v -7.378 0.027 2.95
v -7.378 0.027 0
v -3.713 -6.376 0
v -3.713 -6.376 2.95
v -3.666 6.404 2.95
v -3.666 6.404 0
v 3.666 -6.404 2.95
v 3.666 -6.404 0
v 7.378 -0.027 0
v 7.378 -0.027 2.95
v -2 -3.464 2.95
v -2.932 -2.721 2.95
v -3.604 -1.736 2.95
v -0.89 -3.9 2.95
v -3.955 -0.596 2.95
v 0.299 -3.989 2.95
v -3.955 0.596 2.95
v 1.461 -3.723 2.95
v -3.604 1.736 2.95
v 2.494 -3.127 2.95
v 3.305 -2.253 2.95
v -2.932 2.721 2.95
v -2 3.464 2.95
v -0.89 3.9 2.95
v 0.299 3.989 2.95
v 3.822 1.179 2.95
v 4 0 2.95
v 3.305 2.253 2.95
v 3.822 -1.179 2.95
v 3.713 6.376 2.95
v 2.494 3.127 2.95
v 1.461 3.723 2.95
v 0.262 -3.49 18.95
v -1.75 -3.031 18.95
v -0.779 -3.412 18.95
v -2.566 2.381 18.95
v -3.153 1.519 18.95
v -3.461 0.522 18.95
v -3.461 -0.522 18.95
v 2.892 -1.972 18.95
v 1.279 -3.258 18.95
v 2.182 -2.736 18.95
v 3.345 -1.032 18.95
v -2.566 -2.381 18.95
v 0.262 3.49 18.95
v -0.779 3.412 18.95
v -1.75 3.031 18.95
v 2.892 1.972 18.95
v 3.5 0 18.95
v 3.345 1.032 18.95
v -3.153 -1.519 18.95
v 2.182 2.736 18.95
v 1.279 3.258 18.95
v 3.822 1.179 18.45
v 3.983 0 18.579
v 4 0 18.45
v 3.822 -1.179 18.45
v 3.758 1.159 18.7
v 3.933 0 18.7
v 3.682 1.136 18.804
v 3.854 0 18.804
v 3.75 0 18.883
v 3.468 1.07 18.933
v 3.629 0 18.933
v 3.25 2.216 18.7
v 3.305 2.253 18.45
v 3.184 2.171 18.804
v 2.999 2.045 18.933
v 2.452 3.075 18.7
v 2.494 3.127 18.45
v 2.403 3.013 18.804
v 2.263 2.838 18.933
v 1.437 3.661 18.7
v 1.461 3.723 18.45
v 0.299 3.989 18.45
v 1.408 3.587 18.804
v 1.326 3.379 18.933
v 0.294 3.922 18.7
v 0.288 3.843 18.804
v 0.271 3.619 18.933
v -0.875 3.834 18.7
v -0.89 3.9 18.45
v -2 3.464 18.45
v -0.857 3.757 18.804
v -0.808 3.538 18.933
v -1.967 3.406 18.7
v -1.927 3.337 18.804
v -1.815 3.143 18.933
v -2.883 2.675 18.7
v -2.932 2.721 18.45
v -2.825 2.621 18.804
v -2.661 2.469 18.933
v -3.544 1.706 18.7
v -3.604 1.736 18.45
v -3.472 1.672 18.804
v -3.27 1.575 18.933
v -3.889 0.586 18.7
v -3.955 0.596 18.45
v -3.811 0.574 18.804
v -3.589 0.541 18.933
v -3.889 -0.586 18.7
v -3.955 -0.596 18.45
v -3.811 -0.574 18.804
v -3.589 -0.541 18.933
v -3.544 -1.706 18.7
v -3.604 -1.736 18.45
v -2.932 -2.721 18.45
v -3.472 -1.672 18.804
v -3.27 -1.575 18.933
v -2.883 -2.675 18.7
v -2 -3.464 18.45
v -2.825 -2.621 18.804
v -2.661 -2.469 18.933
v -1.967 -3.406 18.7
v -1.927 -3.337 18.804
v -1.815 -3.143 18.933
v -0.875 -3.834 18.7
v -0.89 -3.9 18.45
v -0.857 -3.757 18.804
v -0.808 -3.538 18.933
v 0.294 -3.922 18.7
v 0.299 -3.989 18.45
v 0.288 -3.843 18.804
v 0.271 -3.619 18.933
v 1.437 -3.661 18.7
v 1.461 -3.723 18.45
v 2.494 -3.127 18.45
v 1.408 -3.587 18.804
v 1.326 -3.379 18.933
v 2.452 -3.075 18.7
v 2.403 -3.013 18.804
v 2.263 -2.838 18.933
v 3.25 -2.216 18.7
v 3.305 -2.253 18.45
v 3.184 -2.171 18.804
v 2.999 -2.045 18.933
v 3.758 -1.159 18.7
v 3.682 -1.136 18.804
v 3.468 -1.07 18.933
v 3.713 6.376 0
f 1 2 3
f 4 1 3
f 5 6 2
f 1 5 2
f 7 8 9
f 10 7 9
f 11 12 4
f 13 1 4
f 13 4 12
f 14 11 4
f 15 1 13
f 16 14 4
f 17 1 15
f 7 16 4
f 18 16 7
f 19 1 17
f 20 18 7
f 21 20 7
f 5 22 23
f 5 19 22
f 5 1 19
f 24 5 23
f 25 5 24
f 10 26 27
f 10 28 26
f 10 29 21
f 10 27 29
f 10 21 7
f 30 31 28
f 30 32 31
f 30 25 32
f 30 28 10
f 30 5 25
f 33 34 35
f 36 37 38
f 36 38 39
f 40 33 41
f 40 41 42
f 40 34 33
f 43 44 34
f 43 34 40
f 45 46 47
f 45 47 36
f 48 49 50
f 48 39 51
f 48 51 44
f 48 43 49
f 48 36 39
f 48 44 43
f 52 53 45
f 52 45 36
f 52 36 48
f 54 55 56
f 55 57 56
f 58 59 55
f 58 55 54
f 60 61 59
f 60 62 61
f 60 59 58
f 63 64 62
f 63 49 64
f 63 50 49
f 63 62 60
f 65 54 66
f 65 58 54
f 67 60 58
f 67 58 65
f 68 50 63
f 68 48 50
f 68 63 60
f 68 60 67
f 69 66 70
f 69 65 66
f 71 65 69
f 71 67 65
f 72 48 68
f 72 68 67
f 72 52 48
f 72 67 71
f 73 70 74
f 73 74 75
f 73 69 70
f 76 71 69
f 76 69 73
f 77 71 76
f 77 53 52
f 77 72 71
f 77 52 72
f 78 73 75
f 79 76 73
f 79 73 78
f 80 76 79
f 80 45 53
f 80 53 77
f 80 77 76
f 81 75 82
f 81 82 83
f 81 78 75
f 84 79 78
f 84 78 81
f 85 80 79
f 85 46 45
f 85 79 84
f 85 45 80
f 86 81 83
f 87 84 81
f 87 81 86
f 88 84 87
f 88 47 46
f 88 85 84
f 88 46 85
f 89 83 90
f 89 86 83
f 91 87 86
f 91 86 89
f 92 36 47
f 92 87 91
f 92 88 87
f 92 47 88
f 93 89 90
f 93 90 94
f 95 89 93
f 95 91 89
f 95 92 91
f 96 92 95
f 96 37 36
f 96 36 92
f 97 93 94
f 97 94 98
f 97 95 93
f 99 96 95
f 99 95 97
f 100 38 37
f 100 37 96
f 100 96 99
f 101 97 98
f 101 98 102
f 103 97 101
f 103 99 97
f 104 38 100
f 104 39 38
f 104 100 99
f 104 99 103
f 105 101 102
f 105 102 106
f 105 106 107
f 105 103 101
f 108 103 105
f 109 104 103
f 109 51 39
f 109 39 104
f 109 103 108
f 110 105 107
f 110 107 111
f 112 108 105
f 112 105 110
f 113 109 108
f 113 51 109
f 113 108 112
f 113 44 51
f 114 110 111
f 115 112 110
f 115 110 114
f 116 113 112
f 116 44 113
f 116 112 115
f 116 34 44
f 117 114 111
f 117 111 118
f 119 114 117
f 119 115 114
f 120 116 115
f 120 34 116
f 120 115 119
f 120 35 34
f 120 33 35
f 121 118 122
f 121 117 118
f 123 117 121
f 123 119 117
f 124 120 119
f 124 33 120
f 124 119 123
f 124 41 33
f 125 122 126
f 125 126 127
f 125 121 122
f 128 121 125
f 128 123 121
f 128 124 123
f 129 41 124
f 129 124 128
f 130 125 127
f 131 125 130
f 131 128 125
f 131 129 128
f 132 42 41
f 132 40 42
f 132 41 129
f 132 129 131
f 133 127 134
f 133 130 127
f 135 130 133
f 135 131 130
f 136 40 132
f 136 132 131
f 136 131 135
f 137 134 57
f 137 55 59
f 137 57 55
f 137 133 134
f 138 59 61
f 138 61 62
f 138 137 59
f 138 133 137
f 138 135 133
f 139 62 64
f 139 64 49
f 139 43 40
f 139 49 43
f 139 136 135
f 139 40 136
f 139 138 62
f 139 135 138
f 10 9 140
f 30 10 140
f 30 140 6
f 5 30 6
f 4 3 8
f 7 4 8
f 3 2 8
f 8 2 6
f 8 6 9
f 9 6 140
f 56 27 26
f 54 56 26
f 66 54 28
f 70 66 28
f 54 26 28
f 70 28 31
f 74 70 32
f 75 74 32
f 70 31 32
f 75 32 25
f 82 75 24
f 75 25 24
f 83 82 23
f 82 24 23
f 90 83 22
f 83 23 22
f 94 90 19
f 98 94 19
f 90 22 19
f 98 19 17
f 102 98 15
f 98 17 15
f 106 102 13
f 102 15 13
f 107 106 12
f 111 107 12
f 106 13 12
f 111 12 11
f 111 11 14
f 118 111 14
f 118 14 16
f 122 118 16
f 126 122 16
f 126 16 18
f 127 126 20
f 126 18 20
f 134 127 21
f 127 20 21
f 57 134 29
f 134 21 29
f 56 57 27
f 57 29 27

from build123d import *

# Parameters (mm, degrees)
Y_KSEKLIK_EKSTR_ZYON1_DEPTH = 2.95
IZIM3_R                     = 4
Y_KSEKLIK_EKSTR_ZYON2_DEPTH = 16
RADYUS3_R                   = 0.5


with BuildPart() as part:
    # Çizim2 → Yükseklik-Ekstrüzyon1 (new body)
    with BuildSketch(Plane.XY):
        Polygon((3.712848138, 6.376327996), (-3.665637958, 6.403584805), (-7.378486096, 0.02725681), (-3.712848138, -6.376327996), (3.665637958, -6.403584805), (7.378486096, -0.02725681), align=None)
    extrude(amount=Y_KSEKLIK_EKSTR_ZYON1_DEPTH)

    # Çizim3 → Yükseklik-Ekstrüzyon2 (add)
    with BuildSketch(Plane.XY.offset(2.95)):
        Circle(IZIM3_R)
    extrude(amount=Y_KSEKLIK_EKSTR_ZYON2_DEPTH)

    # Radyus3
    radyus3_edges = [part.edges().sort_by_distance(p)[0] for p in [
        (-4, 0, 18.95),
    ]]
    fillet(radyus3_edges, radius=RADYUS3_R)


solid = part.part
